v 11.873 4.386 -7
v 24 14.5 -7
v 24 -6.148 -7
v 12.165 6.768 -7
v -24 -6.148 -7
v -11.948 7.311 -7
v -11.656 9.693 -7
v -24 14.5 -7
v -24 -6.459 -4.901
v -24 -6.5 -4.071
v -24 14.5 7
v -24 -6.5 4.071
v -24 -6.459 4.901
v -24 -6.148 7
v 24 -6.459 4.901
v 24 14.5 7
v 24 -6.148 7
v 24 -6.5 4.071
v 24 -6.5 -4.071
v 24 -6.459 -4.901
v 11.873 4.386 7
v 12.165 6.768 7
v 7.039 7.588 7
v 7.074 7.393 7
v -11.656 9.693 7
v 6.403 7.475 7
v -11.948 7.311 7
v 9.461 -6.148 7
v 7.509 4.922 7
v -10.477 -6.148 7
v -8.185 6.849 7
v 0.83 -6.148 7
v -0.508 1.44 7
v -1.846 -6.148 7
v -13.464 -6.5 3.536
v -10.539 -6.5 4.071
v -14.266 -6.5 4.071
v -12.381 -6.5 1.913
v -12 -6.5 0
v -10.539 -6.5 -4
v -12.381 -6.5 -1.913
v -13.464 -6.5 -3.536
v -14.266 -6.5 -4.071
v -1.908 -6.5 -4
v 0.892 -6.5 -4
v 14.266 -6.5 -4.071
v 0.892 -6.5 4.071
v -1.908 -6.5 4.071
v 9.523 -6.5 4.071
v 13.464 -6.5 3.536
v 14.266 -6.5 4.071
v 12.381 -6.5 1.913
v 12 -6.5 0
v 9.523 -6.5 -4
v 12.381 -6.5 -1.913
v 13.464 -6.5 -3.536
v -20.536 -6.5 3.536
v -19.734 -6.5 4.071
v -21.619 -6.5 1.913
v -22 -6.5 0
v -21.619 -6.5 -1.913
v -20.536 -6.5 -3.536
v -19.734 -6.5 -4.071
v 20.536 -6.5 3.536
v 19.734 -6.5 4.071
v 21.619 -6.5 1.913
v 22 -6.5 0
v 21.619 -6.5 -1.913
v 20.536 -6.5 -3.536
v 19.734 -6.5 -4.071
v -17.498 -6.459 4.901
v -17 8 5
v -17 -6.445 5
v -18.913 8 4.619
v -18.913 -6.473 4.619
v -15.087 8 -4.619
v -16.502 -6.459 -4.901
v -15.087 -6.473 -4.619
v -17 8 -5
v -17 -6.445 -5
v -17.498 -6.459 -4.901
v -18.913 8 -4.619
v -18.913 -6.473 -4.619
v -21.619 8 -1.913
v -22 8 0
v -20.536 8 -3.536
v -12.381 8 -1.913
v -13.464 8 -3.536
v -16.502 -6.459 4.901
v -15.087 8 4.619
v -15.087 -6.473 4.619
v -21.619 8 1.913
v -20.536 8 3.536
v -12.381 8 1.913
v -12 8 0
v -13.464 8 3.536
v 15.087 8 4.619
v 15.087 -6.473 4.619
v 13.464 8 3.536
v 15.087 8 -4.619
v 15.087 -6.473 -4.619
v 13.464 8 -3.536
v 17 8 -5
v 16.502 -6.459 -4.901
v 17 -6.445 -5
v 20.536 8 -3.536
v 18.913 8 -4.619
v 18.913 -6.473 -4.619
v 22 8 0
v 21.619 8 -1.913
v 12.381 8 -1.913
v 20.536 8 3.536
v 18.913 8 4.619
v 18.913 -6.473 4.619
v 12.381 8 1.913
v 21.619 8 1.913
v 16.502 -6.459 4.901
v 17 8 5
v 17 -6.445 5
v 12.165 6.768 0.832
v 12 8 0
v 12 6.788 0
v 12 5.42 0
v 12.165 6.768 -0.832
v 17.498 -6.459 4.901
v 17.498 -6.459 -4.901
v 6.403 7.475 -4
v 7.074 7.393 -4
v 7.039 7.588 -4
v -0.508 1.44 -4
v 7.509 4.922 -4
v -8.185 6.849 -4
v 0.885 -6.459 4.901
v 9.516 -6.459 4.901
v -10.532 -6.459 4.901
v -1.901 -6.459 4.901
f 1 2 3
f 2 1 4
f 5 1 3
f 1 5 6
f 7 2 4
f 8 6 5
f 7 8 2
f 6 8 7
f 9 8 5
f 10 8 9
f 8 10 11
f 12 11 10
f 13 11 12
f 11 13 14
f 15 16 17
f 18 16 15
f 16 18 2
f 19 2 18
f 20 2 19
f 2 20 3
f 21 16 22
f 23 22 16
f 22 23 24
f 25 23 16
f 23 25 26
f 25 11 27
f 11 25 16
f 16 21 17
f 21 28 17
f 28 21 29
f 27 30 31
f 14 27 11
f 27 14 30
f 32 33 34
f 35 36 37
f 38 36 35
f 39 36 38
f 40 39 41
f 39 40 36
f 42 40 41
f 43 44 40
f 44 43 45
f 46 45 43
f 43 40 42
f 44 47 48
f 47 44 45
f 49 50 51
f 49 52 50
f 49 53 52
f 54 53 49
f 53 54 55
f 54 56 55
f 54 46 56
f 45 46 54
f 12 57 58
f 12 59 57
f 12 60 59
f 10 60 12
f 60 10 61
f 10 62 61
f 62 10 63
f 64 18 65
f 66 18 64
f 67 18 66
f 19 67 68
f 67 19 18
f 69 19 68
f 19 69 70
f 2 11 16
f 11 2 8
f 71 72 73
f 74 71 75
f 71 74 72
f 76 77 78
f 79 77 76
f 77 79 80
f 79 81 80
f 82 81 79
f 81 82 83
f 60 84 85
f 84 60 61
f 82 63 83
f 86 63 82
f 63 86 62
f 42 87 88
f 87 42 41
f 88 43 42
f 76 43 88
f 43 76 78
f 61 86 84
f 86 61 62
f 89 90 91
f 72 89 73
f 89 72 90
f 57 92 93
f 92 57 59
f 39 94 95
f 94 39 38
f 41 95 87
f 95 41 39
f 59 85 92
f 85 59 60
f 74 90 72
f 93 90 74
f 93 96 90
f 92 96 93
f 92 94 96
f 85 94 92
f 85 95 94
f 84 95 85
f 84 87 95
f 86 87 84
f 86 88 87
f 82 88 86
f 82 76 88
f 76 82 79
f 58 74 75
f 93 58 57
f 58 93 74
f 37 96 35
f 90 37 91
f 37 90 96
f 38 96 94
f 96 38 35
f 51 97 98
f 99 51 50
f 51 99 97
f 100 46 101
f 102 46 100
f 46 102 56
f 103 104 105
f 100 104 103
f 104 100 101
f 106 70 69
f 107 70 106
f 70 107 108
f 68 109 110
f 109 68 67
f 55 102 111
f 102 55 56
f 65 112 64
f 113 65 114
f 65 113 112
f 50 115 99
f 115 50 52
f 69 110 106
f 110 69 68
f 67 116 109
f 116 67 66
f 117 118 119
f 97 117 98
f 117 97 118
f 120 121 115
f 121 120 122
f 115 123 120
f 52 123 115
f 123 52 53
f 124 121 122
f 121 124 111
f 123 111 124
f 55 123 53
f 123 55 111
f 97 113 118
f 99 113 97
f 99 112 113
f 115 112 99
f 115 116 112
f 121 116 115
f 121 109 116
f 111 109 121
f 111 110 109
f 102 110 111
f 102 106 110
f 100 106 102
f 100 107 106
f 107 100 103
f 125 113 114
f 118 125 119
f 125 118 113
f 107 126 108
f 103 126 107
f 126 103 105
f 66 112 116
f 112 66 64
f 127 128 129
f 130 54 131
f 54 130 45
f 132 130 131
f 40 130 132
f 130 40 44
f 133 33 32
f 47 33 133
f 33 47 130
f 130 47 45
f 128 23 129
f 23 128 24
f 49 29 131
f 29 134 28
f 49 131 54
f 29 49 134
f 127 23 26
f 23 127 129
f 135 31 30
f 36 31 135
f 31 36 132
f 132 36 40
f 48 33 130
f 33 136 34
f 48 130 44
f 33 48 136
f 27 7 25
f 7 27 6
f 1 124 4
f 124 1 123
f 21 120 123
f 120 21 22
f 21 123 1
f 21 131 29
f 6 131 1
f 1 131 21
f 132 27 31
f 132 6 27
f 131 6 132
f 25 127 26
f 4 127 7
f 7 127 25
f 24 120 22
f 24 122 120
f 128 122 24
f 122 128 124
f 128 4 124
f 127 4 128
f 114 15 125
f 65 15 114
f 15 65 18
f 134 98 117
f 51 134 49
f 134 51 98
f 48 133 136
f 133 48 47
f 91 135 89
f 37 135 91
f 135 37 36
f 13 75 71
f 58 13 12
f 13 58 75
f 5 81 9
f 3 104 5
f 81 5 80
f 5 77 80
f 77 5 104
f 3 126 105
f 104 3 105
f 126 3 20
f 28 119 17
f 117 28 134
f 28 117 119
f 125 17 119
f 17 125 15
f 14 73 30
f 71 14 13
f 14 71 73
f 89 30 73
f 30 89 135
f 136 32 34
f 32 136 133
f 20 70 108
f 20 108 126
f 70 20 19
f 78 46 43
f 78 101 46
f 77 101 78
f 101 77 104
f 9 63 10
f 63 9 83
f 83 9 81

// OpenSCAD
diameter=10;
height=4;
number=3;
distance=5;
baseline=30; 


module maghole(diameter,height,number,back) {
		translate([0,height*(number-2)/2,0])
        rotate([90,0,0])
         cylinder(r=diameter/2,h=height*(2*number-1),center=true);
    if(back == 1) {
		translate([0,-height*2*(number+1)/2,0])
        rotate([90,0,0])
         cylinder(r=diameter/2,h=height*number,center=true);
    }
}

module smaghole(diameter,height,number,back) {
		translate([0,.15+height*(number-2)/2,0])
        rotate([90,0,0])
         cylinder(r=0.3+diameter/2,h=height*(2*number-1),center=true);
    if(back == 1) {
		translate([0,-(0.15+height*2*(number+1)/2),0])
        rotate([90,0,0])
         cylinder(r=0.3+diameter/2,h=height*number,center=true);
    }
}
module mirror(diameter,height,number,distance,baseline) {
width=diameter+4;
depth=distance+height*number+4;
length=baseline+diameter+8;
mirrorthick = 1.8;
   difference() {
     translate([0,-height,0])
	   cube([width,  // Small dimension
            depth, // Optical path dim
		      length],center=true);
      translate([0,0,2+baseline/2])
             maghole(diameter,height,number,0);
     translate([0,0,-(2+baseline/2)])
             maghole(diameter,height,number,0);
     rotate([-10,0,0])
     translate([-4,depth/4,-4])
          cube([width+2,depth+2,((length-2*width)/2)-1.5],center=true);
     rotate([10,0,0])
     translate([-4,depth/4,+5])
          cube([width+2,depth+2,((length-2*width)/2)-1.5],center=true);
    rotate([7,0,0])
     translate([0,-depth/3,0.75])
          cube([width+2,mirrorthick+0.6,length-(2*diameter+4)],center=true);
     }
}

module sensor(diameter,height,number,distance,baseline) {
width=diameter+4;
depth=distance+height*number+4;
length=baseline+diameter+8;
mirrorthick = 2.6;
extra=2*width+4;

   difference() {
     translate([2+width/2,-height,0])
	   cube([extra,  // Small dimension
            depth, // Optical path dim
		      length],center=true);
      translate([0,0,2+baseline/2])
             smaghole(diameter,height,number,1);
     translate([0,0,-(2+baseline/2)])
             smaghole(diameter,height,number,1);
//LASER
     translate([0,0,4])
        rotate([90,0,0])
             cylinder(r=3.2,h=40,center=true,$fn=24);
//PhotoTransistor
     translate([0,0,-2])
        rotate([90,0,0])
             cylinder(r=2,h=40,center=true,$fn=12);
// TEMP SENSOR
     translate([2+width,0,0])
        rotate([90,0,0])
             cylinder(r=4.7,h=40,center=true);

     }

     difference() {
     translate([0,-4,-2.5])cube([5,6,5],center=true);
     translate([0,-8,0])
        cylinder(r=3.2,h=10,center=true,$fn=12);
     translate([0,0,-1.2])
        rotate([90,0,0])
             cylinder(r=0.6,h=40,center=true,$fn=6);
     translate([0,0,-2.8])
        rotate([90,0,0])
             cylinder(r=0.6,h=40,center=true,$fn=6);
     }
}

module jarwall() {
  difference() {
     cube([40,40,120],center=true);
	  translate([40,0,0])
	     cylinder(r=50,h=120,center=true,$fn=64);
	   }
}

module jar() {
	  translate([-8,110,-10])
	          cylinder(r=50,h=120,center=true,$fn=64);
}

module powerhole(dim) {
offset = dim+2;
  //  cylinder(r=dim,h=2*dim,center=true,$fn=10);
  //  translate([dim-1.6,0,0])
   //   cylinder(r=dim,h=dim,center=true,$fn=10);
    translate([dim-3,0,0]) cube([2*dim+2,2*dim-1,2*dim-1],center=true);
    translate([-offset,0,0])
      cylinder(r=1.1,h=2*dim,center=true,$fn=10);
    translate([offset+2,0,0])
      cylinder(r=1.1,h=2*dim,center=true,$fn=10);
}

module sensordevice() {
  wall = 32;
  side = 44;
  deep = 50;
  difference() { 
   sensor(diameter,height,number,distance,baseline);
   translate([6,-60,3]) jar();
  }
  translate([-7,-(wall+30),21]) cube([wall,side+12,3]);

     translate([-7,-(wall+30),-24])
         cube([wall,side+12,3]);

  difference() {
  translate([23.5,-(wall+7),0])
    rotate([0,90,0])
    cube([side,deep,3],center=true);
     translate([24,-54,12])
			rotate([0,90,0]) 
           powerhole(4.5);
  }
}
module mirrordevice() {
  difference() { 
   mirror(diameter,height,number,distance,baseline);
   translate([0,-3.3,0]) rotate([0,0,-90]) jarwall();
  }
}

rotate([0,90,180]) 
  // sensordevice();
   mirrordevice();



     
